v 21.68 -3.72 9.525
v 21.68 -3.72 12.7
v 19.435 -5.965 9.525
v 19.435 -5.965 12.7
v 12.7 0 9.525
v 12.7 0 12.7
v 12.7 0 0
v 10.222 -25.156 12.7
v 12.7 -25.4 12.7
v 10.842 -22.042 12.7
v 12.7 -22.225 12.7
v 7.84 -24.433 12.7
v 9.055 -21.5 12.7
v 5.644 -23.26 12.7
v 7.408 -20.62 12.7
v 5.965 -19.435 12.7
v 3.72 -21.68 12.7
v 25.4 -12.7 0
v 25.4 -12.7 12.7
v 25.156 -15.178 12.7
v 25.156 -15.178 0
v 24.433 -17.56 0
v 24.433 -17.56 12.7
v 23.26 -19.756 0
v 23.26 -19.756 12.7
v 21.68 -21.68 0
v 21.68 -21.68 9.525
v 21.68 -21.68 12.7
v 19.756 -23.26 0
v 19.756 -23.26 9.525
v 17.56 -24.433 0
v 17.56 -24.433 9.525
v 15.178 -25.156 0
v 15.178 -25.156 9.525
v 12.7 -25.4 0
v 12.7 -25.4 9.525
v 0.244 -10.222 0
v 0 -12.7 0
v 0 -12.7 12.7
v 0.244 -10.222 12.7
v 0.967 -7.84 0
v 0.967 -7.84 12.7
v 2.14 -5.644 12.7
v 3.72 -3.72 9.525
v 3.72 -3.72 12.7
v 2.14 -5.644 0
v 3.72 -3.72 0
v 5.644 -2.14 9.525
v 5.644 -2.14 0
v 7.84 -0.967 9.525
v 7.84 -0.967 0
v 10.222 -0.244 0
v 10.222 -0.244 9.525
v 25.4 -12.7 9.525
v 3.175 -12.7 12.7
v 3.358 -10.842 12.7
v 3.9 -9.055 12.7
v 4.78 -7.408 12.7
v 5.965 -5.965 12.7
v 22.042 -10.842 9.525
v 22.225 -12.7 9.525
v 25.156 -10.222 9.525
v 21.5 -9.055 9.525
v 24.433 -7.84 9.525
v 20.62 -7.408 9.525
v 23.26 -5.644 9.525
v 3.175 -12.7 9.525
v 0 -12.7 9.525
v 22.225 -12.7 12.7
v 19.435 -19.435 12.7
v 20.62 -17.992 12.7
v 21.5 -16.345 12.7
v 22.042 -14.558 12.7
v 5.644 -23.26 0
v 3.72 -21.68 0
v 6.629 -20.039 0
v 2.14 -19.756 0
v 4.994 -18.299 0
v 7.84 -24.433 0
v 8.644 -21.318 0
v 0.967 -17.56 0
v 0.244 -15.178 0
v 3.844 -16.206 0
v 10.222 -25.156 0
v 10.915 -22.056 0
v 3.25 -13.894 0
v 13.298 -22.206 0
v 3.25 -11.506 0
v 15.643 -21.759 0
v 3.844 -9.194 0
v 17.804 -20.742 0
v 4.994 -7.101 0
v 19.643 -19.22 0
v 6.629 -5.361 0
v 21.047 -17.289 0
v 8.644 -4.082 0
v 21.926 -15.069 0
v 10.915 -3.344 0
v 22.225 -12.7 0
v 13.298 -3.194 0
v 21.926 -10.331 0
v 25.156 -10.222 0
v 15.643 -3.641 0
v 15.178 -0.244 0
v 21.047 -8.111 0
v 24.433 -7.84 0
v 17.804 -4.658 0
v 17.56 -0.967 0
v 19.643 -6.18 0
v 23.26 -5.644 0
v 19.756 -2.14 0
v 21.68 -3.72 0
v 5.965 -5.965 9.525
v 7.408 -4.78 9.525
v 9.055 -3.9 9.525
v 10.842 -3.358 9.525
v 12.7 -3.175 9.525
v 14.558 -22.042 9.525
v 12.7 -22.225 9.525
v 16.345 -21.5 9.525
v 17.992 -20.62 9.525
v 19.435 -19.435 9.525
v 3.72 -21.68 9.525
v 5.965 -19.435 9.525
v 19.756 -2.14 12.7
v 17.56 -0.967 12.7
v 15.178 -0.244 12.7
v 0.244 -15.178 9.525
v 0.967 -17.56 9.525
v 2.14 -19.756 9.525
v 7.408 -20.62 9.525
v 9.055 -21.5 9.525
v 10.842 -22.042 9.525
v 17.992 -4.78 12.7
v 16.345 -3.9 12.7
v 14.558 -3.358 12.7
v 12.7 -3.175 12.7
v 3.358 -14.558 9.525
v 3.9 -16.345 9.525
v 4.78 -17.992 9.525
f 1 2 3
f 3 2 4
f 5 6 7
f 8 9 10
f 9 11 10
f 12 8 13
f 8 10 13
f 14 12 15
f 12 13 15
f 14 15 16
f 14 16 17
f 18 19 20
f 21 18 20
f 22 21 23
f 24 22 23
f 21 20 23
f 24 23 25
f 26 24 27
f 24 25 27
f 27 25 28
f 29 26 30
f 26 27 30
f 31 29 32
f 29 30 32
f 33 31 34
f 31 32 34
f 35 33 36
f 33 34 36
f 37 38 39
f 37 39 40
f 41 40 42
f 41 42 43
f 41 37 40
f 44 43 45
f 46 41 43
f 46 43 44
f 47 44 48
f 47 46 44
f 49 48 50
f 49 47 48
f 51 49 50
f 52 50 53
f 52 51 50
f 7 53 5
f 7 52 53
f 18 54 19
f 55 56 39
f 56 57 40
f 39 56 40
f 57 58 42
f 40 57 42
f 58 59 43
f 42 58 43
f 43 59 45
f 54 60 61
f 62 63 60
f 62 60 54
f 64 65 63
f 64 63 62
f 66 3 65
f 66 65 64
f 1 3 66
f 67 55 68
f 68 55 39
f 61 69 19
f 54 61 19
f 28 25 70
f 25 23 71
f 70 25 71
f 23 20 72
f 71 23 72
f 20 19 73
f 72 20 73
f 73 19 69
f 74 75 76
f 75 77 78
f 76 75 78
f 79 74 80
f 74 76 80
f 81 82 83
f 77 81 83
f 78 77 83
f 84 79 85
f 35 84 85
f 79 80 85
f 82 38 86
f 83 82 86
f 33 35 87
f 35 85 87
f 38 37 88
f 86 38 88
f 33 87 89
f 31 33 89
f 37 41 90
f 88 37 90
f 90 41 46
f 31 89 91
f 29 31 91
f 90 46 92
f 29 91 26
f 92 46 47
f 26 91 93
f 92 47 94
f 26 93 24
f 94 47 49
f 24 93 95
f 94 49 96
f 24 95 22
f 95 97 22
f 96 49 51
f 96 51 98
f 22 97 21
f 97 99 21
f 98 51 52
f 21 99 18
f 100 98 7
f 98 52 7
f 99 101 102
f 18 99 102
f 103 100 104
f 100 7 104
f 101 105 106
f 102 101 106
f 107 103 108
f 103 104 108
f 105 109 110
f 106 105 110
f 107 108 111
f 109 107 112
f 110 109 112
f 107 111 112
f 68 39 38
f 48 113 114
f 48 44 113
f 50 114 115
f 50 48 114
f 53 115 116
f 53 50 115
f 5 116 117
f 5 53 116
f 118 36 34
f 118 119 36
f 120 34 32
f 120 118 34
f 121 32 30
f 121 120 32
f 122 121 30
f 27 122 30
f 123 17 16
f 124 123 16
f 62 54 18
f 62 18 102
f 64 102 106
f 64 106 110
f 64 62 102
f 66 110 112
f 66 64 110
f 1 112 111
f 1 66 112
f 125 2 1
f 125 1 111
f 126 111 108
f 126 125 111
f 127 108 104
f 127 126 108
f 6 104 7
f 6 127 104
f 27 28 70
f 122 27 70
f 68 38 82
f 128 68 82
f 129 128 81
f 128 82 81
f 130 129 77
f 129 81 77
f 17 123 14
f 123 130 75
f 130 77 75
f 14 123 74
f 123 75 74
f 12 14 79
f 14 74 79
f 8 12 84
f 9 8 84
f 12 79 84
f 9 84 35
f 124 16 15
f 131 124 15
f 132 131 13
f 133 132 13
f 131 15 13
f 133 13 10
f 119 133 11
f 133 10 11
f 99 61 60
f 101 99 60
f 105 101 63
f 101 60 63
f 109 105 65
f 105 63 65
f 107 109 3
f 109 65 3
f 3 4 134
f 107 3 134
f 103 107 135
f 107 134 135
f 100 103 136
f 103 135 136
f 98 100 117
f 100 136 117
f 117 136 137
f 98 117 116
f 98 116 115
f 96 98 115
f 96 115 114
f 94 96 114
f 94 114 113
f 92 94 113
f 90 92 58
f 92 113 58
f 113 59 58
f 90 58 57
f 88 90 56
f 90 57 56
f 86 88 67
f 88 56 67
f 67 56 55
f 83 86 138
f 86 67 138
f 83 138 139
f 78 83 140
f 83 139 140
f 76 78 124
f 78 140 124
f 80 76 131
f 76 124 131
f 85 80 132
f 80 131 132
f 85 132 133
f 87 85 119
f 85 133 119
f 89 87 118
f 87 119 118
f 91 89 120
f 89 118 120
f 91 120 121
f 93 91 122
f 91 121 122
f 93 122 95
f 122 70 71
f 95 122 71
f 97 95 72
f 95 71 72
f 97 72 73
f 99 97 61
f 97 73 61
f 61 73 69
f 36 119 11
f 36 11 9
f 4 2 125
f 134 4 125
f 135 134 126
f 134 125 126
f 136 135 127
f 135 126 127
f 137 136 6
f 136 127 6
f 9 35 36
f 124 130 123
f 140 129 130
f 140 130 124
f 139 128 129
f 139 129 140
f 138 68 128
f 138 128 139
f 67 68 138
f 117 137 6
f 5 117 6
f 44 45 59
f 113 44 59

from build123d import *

# Parameters (mm, degrees)
F0_W     = 5.08
F0_H     = 3.175
F1_DEPTH = 25.4
F2_R     = 12.69999
F3_R     = 9.525
F4_DEPTH = 12.701
F6_DEPTH = 3.175


# Not quite as in the source:
# - a fillet or chamfer is up to 0.001 mm smaller than in the source, because OpenCascade refuses the exact size
# - ends of sketch curves that miss each other by under 0.0002 mm in the source are joined


with BuildPart() as f1:
    # F0 (on Front) → F1 (new body)
    with BuildSketch(Plane.XZ):
        Polygon((25.4, 0), (25.4, 12.7), (20.32, 12.7), (20.32, 9.525), (15.24, 9.525), (15.24, 12.7), (10.16, 12.7), (10.16, 9.525), (5.08, 9.525), (5.08, 12.7), (0, 12.7), (0, 0), align=None)
        with Locations((17.78, 11.1125)):
            Rectangle(F0_W, F0_H)
        with Locations((7.62, 11.1125)):
            Rectangle(F0_W, F0_H)
    extrude(amount=F1_DEPTH)

    # F2 (radius 12.7 in the source; OpenCascade refuses exactly that, so slightly less here)
    f2_edges = [f1.edges().sort_by_distance(p)[0] for p in [
        (0, -25.4, 6.35),
        (25.4, -25.4, 6.35),
        (25.4, 0, 6.35),
        (0, 0, 6.35),
    ]]
    fillet(f2_edges, radius=F2_R)

    # F3 (on face) → F4 (cut, through all)
    with BuildSketch(Plane.XY.offset(12.7)):
        with Locations((12.7, -12.7)):
            Circle(F3_R)
    extrude(amount=-F4_DEPTH, mode=Mode.SUBTRACT)

    # F5 (on face) → F6 (cut)
    with BuildSketch(Plane.XY.offset(12.7)):
        with BuildLine():
            ThreePointArc((19.4351920908, -19.4351920908), (21.4999525472, -16.3450596933), (22.225, -12.7))
            ThreePointArc((22.225, -12.7), (21.4999525472, -9.0549403067), (19.4351920908, -5.9648079092))
            ThreePointArc((19.4351920908, -5.9648079092), (16.3450596933, -3.9000474528), (12.7, -3.175))
            ThreePointArc((12.7, -3.175), (9.0549403067, -3.9000474528), (5.9648079092, -5.9648079092))
            ThreePointArc((5.9648079092, -5.9648079092), (3.9000474528, -9.0549403067), (3.175, -12.7))
            ThreePointArc((3.175, -12.7), (3.9000474528, -16.3450596933), (5.9648079092, -19.4351920908))
            ThreePointArc((5.9648079092, -19.4351920908), (9.0549403067, -21.4999525472), (12.7, -22.225))
            ThreePointArc((12.7, -22.225), (16.3450596933, -21.4999525472), (19.4351920908, -19.4351920908))
        make_face()
        with BuildLine():
            ThreePointArc((12.69999, 0), (7.8399142358, -0.9667291759), (3.71974095, -3.71974095))
            Line((3.71974095, -3.71974095), (5.9648079092, -5.9648079092))
            ThreePointArc((5.9648079092, -5.9648079092), (9.0549403067, -3.9000474528), (12.7, -3.175))
            Line((12.7, -3.175), (12.69999, 0))
        make_face()
        with BuildLine():
            ThreePointArc((25.4, -12.69999), (24.4332708241, -7.8399142358), (21.68025905, -3.71974095))
            Line((21.68025905, -3.71974095), (19.4351920908, -5.9648079092))
            ThreePointArc((19.4351920908, -5.9648079092), (21.4999525472, -9.0549403067), (22.225, -12.7))
            Line((22.225, -12.7), (25.4, -12.69999))
        make_face()
        with BuildLine():
            Line((3.175, -12.7), (0, -12.7))
            ThreePointArc((0, -12.7), (0.9667291759, -17.5600857642), (3.71974095, -21.68025905))
            Line((3.71974095, -21.68025905), (5.9648079092, -19.4351920908))
            ThreePointArc((5.9648079092, -19.4351920908), (3.9000474528, -16.3450596933), (3.175, -12.7))
        make_face()
        with BuildLine():
            Line((12.7, -22.225), (12.7, -25.4))
            ThreePointArc((12.7, -25.4), (17.5600857642, -24.4332708241), (21.68025905, -21.68025905))
            Line((21.68025905, -21.68025905), (19.4351920908, -19.4351920908))
            ThreePointArc((19.4351920908, -19.4351920908), (16.3450596933, -21.4999525472), (12.7, -22.225))
        make_face()
    extrude(amount=-F6_DEPTH, mode=Mode.SUBTRACT)


solid = f1.part
